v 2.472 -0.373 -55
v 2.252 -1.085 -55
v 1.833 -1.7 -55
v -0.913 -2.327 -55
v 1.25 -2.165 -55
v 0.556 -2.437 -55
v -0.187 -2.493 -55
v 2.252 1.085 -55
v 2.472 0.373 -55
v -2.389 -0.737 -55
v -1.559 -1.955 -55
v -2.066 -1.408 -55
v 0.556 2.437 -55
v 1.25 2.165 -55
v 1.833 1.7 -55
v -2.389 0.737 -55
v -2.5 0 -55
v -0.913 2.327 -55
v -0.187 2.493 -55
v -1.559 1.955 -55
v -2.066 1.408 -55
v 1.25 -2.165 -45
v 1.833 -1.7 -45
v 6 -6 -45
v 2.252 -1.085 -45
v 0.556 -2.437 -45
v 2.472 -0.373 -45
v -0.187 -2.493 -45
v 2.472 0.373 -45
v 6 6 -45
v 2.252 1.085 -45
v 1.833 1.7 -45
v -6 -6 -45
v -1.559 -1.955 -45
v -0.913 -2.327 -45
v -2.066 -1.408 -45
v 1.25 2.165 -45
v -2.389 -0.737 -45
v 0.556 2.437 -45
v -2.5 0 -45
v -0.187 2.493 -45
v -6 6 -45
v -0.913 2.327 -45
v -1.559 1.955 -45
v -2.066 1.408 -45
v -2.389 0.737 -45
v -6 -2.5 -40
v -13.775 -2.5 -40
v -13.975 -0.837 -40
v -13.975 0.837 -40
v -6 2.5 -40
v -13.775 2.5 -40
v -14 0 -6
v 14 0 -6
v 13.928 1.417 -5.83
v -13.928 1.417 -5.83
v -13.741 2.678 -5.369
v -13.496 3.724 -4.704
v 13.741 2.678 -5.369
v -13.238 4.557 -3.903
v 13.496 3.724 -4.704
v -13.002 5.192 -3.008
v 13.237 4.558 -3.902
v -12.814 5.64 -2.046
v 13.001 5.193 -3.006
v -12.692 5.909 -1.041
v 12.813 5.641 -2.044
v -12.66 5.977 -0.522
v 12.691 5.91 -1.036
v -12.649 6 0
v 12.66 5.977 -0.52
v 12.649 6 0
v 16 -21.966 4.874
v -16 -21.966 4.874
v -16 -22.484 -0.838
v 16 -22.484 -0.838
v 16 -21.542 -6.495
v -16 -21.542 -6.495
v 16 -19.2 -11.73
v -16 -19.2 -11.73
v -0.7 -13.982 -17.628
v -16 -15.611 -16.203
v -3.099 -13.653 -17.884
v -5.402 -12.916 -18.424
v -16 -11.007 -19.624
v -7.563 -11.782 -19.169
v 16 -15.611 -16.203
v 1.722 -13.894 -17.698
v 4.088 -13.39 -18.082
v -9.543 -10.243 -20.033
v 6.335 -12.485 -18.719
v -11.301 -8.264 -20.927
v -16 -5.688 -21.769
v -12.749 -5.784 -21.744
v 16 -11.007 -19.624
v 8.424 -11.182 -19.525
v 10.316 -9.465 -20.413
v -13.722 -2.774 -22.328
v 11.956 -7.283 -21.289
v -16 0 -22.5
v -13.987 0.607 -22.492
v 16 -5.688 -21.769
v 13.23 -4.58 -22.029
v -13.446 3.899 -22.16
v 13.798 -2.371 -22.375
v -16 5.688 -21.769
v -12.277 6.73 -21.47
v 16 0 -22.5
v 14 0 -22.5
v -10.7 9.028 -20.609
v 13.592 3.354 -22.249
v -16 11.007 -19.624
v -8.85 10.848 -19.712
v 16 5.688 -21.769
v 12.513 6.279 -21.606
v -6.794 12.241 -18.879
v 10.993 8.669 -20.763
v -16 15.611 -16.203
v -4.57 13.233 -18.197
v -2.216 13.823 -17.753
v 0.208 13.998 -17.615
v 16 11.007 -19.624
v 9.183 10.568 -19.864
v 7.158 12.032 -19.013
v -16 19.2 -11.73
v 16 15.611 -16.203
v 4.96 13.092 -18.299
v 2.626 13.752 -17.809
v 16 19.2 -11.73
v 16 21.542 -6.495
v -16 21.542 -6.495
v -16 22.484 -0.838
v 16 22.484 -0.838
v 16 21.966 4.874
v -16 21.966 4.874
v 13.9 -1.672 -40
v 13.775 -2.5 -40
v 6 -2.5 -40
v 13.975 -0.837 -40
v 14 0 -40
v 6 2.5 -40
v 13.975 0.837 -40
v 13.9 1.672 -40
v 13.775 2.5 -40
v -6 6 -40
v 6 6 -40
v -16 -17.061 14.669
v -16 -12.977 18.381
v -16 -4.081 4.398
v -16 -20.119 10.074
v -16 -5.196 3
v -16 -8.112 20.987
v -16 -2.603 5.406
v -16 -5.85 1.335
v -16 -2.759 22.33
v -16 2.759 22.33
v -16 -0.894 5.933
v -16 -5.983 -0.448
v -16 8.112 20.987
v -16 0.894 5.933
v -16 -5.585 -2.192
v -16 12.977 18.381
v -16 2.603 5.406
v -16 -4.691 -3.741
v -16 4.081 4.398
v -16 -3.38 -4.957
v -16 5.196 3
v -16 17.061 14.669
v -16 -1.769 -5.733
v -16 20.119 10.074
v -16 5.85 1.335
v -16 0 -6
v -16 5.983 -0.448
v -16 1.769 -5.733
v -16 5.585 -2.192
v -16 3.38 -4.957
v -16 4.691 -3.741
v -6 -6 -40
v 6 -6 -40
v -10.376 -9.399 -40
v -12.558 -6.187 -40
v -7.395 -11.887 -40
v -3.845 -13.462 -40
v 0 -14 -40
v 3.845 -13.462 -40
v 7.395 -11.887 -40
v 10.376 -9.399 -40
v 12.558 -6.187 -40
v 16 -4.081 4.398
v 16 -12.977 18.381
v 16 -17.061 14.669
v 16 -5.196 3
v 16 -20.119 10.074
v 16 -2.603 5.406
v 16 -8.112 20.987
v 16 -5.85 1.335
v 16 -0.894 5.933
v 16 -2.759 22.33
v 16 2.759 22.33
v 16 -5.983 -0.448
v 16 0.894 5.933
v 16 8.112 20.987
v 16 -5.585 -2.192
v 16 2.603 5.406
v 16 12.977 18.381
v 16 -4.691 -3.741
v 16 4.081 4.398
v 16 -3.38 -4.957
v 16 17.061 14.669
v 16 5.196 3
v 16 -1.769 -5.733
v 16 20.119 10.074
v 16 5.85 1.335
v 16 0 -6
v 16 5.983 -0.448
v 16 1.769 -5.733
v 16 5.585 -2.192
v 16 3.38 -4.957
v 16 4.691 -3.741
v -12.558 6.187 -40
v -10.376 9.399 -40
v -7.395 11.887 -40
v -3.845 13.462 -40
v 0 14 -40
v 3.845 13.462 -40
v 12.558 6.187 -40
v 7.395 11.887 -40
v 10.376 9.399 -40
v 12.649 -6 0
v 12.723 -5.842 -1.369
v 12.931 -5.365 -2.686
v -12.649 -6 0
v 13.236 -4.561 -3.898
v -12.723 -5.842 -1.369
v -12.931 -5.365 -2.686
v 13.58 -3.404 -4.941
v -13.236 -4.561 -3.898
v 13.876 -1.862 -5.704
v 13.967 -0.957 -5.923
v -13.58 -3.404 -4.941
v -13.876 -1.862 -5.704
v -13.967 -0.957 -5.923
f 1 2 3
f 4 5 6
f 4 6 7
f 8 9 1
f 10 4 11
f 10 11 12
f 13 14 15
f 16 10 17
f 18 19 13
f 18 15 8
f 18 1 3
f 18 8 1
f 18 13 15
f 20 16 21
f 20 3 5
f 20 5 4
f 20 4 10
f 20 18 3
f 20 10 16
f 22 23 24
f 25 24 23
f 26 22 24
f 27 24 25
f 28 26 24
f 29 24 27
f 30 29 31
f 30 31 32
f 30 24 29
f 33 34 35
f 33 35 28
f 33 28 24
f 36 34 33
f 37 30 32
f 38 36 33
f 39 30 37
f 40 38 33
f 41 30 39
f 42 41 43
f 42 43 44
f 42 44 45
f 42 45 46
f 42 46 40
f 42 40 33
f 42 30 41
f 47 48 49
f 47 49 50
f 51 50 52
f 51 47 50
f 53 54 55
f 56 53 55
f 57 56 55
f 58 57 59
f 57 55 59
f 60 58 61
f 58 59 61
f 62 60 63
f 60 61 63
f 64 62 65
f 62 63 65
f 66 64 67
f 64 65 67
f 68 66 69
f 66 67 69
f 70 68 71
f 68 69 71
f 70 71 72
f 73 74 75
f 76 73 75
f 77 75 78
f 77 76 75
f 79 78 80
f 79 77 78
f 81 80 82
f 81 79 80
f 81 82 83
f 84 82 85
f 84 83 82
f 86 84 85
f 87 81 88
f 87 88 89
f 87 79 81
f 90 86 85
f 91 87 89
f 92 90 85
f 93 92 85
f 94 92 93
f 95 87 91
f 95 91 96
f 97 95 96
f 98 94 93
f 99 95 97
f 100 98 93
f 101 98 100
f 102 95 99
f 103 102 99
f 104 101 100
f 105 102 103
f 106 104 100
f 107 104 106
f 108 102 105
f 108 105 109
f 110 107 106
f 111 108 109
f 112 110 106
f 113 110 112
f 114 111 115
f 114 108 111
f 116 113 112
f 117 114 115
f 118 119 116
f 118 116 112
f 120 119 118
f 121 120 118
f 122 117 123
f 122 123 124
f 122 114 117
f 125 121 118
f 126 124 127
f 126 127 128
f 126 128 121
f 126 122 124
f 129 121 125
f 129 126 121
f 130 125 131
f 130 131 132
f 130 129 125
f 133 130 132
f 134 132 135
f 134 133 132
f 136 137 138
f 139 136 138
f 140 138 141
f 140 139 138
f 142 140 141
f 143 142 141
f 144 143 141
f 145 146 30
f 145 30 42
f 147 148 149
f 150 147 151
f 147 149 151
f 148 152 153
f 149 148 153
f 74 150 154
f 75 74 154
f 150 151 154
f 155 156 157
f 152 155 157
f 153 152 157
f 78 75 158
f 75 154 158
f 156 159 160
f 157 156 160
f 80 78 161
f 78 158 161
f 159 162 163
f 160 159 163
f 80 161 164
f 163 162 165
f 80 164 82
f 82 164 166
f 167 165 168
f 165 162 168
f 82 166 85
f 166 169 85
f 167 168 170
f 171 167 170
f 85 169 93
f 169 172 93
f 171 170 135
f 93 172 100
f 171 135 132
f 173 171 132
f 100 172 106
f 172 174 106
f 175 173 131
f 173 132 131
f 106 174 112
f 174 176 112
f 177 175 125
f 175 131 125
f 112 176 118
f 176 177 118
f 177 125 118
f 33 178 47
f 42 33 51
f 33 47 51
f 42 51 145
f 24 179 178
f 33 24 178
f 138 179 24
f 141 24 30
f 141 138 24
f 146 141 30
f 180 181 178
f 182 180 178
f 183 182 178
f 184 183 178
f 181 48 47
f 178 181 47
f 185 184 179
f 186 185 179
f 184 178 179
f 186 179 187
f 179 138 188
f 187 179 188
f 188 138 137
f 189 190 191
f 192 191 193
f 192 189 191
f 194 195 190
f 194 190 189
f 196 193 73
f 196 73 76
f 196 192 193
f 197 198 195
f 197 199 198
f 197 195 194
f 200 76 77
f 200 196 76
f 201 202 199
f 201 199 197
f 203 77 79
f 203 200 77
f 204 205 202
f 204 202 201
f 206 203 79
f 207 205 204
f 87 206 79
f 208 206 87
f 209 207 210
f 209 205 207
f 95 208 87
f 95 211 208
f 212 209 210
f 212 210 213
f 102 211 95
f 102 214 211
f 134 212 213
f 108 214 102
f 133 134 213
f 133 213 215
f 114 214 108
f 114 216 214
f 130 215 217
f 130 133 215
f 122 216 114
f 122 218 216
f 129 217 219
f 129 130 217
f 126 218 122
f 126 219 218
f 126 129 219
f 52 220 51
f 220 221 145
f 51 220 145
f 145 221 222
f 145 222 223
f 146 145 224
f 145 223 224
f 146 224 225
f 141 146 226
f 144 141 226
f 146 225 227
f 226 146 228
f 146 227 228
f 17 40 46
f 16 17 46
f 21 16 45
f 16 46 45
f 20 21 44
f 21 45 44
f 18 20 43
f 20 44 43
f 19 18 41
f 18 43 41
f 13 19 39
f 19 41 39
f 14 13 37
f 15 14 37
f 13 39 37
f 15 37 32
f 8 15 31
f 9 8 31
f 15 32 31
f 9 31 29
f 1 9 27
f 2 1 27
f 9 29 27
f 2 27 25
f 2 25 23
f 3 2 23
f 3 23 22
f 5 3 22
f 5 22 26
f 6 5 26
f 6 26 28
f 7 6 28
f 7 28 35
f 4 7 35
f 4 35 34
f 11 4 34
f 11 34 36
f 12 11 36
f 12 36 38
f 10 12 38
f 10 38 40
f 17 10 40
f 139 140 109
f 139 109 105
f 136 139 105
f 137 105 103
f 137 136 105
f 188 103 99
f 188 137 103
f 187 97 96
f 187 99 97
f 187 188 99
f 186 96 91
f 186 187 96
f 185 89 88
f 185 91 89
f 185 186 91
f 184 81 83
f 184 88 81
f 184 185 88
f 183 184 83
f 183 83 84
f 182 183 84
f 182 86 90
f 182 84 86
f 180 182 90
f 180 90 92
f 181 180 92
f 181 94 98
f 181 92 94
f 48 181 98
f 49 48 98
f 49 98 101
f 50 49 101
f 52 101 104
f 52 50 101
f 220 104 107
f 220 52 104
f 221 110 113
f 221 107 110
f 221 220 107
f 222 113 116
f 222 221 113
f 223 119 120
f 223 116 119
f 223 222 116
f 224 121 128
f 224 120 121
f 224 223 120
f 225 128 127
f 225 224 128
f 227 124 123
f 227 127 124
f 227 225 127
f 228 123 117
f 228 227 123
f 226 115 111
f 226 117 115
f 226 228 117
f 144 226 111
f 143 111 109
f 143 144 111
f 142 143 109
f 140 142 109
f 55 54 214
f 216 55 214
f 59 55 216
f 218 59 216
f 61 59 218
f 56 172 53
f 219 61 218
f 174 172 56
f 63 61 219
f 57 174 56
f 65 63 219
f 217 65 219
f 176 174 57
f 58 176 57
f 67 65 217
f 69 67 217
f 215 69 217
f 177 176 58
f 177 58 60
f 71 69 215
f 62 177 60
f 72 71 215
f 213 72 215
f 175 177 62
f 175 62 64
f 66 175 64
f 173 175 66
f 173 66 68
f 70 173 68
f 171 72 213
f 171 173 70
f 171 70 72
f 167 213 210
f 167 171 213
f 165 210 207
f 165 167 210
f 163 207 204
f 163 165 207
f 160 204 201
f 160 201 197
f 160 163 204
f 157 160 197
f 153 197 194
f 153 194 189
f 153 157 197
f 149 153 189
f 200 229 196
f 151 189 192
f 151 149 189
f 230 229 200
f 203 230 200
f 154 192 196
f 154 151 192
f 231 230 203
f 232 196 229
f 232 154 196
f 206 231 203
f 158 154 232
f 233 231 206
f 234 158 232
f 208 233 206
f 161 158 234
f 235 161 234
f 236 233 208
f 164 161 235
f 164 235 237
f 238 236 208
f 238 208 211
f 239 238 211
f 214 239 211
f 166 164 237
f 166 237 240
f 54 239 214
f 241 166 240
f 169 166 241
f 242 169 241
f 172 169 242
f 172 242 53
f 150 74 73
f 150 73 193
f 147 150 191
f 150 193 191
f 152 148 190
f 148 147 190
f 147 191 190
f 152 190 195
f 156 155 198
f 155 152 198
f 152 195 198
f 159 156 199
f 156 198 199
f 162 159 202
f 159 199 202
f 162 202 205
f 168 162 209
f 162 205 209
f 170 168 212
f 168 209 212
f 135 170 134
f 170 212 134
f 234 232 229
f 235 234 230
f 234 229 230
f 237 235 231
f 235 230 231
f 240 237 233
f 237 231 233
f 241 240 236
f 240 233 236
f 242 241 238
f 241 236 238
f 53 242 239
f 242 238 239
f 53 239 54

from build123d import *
from build123d.topology import SkipClean

# Parameters (mm, degrees)
SKETCH2_R           = 6
BOSS_EXTRUDE1_DEPTH = 16
SKETCH3_R           = 14
BOSS_EXTRUDE2_DEPTH = 40
SKETCH4_R           = 6
CUT_EXTRUDE1_DEPTH  = 56.948637328
SKETCH5_W           = 28
SKETCH5_H           = 30
BOSS_EXTRUDE3_DEPTH = 2.5
SKETCH8_R           = 15.28865651
SKETCH8_R_2         = 14
CUT_EXTRUDE2_DEPTH  = 35
SKETCH9_R           = 3
CUT_EXTRUDE3_DEPTH  = 35
CUT_EXTRUDE4_DEPTH  = 81.18883969
SKETCH11_W          = 30
SKETCH11_H          = 5
CUT_EXTRUDE5_DEPTH  = 15
SKETCH14_R          = 2.5
BOSS_EXTRUDE4_DEPTH = 15
SKETCH17_W          = 12
SKETCH17_H          = 12
BOSS_EXTRUDE6_DEPTH = 5


with BuildPart() as part:
    # Sketch2 → Boss-Extrude1 (new, symmetric)
    with BuildSketch(Plane(origin=(0, 0, 0), x_dir=(0, 0, -1), z_dir=(1, 0, 0))):
        with BuildLine():
            Line((-25, -17.5), (-4.873971328, -21.965755245))
            ThreePointArc((-4.873971328, -21.965755245), (22.5, 0), (-4.873971328, 21.965755245))
            Line((-4.873971328, 21.965755245), (-25, 17.5))
            Line((-25, 17.5), (-25, -17.5))
        make_face()
        Circle(SKETCH2_R, mode=Mode.SUBTRACT)
    extrude(amount=BOSS_EXTRUDE1_DEPTH, both=True)

    # Sketch3 → Boss-Extrude2 (add)
    with BuildSketch(Plane.XY):
        Circle(SKETCH3_R)
    extrude(amount=-BOSS_EXTRUDE2_DEPTH)

    # Sketch4 → Cut-Extrude1 (cut, through all)
    with BuildSketch(Plane(origin=(16, 0, 0), x_dir=(0, 0, -1), z_dir=(1, 0, 0))):
        Circle(SKETCH4_R)
    extrude(amount=-CUT_EXTRUDE1_DEPTH, mode=Mode.SUBTRACT)

    # Sketch5 → Boss-Extrude3 (add, symmetric)
    with BuildSketch(Plane(origin=(0, 0, 0), x_dir=(1, 0, 0), z_dir=(0, 1, 0))):
        with Locations((0, 55)):
            Rectangle(SKETCH5_W, SKETCH5_H)
    extrude(amount=BOSS_EXTRUDE3_DEPTH, both=True)

    # Sketch8 → Cut-Extrude2 (cut)
    with BuildSketch(Plane(origin=(0, 0, -70), x_dir=(-1, 0, 0), z_dir=(0, 0, -1))):
        Circle(SKETCH8_R)
        with Locations(Location((0, 0, 0), (0, 0, 180))):
            Circle(SKETCH8_R_2, mode=Mode.SUBTRACT)
    extrude(amount=-CUT_EXTRUDE2_DEPTH, mode=Mode.SUBTRACT)

    # Sketch9 → Cut-Extrude3 (cut)
    with BuildSketch(Plane(origin=(0, 2.5, 0), x_dir=(1, 0, 0), z_dir=(0, 1, 0))):
        with Locations(Location((-9, 62, 0), (0, 0, 270))):
            Circle(SKETCH9_R)
        with Locations(Location((9, 62, 0), (0, 0, 270))):
            Circle(SKETCH9_R)
    extrude(amount=-CUT_EXTRUDE3_DEPTH, mode=Mode.SUBTRACT)

    # Sketch10 → Cut-Extrude4 (cut, through all)
    with SkipClean():  # the faces are left unmerged after this step: merging them gives an invalid solid
        with BuildSketch(Plane(origin=(16, 0, 0), x_dir=(0, 0, -1), z_dir=(1, 0, 0))):
            with BuildLine():
                Line((-25, -17.5), (-4.873971328, -21.965755245))
                ThreePointArc((-4.873971328, -21.965755245), (-22.5, 0), (-4.873971328, 21.965755245))
                Line((-4.873971328, 21.965755245), (-25, 17.5))
                Line((-25, 17.5), (-25, -17.5))
            make_face()
        extrude(amount=-CUT_EXTRUDE4_DEPTH, mode=Mode.SUBTRACT)

    # Sketch11 → Cut-Extrude5 (cut, symmetric)
    with SkipClean():  # the faces are left unmerged after this step: merging them gives an invalid solid
        with BuildSketch(Plane(origin=(0, 0, 0), x_dir=(0, 0, -1), z_dir=(1, 0, 0))):
            with Locations((55, 0)):
                Rectangle(SKETCH11_W, SKETCH11_H)
        extrude(amount=CUT_EXTRUDE5_DEPTH, both=True, mode=Mode.SUBTRACT)

    # Sketch14 → Boss-Extrude4 (add)
    with SkipClean():  # the faces are left unmerged after this step: merging them gives an invalid solid
        with BuildSketch(Plane(origin=(0, 0, -40), x_dir=(-1, 0, 0), z_dir=(0, 0, -1))):
            Circle(SKETCH14_R)
        extrude(amount=BOSS_EXTRUDE4_DEPTH)

    # Sketch17 → Boss-Extrude6 (add)
    with SkipClean():  # the faces are left unmerged after this step: merging them gives an invalid solid
        with BuildSketch(Plane(origin=(0, 0, -40), x_dir=(-1, 0, 0), z_dir=(0, 0, -1))):
            Rectangle(SKETCH17_W, SKETCH17_H)
        extrude(amount=BOSS_EXTRUDE6_DEPTH)


solid = part.part
